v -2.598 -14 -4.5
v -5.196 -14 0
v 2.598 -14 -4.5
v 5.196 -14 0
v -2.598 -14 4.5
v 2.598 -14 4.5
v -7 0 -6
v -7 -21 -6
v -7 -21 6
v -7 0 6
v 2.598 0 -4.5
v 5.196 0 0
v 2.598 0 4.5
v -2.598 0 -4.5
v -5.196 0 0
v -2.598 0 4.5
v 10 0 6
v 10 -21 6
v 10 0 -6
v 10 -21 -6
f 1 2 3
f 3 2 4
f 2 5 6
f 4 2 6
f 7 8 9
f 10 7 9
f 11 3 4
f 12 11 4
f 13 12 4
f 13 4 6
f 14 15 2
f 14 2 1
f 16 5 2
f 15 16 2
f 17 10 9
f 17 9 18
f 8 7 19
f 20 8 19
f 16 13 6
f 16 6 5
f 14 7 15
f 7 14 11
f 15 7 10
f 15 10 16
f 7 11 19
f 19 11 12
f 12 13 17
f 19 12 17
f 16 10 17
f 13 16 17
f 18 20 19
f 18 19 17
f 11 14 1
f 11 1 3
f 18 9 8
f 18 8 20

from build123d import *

# Parameters (mm, degrees)
F0_W     = 17
F0_H     = 12
F1_DEPTH = 21
F2_DEPTH = 14


with BuildPart() as f1:
    # F0 (on Front) → F1 (new body)
    with BuildSketch(Plane.XZ):
        with Locations((1.5, 0)):
            Rectangle(F0_W, F0_H)
        Polygon((-5.196152, 0), (-2.598076, 4.5), (2.598076, 4.5), (5.196152, 0), (2.598076, -4.5), (-2.598076, -4.5), align=None, mode=Mode.SUBTRACT)
        Polygon((2.598076, 4.5), (-2.598076, 4.5), (-5.196152, 0), (-2.598076, -4.5), (2.598076, -4.5), (5.196152, 0), align=None)
    extrude(amount=F1_DEPTH)

    # F0 (on Front) → F2 (cut)
    with BuildSketch(Plane.XZ):
        Polygon((2.598076, 4.5), (-2.598076, 4.5), (-5.196152, 0), (-2.598076, -4.5), (2.598076, -4.5), (5.196152, 0), align=None)
    extrude(amount=F2_DEPTH, mode=Mode.SUBTRACT)


solid = f1.part
